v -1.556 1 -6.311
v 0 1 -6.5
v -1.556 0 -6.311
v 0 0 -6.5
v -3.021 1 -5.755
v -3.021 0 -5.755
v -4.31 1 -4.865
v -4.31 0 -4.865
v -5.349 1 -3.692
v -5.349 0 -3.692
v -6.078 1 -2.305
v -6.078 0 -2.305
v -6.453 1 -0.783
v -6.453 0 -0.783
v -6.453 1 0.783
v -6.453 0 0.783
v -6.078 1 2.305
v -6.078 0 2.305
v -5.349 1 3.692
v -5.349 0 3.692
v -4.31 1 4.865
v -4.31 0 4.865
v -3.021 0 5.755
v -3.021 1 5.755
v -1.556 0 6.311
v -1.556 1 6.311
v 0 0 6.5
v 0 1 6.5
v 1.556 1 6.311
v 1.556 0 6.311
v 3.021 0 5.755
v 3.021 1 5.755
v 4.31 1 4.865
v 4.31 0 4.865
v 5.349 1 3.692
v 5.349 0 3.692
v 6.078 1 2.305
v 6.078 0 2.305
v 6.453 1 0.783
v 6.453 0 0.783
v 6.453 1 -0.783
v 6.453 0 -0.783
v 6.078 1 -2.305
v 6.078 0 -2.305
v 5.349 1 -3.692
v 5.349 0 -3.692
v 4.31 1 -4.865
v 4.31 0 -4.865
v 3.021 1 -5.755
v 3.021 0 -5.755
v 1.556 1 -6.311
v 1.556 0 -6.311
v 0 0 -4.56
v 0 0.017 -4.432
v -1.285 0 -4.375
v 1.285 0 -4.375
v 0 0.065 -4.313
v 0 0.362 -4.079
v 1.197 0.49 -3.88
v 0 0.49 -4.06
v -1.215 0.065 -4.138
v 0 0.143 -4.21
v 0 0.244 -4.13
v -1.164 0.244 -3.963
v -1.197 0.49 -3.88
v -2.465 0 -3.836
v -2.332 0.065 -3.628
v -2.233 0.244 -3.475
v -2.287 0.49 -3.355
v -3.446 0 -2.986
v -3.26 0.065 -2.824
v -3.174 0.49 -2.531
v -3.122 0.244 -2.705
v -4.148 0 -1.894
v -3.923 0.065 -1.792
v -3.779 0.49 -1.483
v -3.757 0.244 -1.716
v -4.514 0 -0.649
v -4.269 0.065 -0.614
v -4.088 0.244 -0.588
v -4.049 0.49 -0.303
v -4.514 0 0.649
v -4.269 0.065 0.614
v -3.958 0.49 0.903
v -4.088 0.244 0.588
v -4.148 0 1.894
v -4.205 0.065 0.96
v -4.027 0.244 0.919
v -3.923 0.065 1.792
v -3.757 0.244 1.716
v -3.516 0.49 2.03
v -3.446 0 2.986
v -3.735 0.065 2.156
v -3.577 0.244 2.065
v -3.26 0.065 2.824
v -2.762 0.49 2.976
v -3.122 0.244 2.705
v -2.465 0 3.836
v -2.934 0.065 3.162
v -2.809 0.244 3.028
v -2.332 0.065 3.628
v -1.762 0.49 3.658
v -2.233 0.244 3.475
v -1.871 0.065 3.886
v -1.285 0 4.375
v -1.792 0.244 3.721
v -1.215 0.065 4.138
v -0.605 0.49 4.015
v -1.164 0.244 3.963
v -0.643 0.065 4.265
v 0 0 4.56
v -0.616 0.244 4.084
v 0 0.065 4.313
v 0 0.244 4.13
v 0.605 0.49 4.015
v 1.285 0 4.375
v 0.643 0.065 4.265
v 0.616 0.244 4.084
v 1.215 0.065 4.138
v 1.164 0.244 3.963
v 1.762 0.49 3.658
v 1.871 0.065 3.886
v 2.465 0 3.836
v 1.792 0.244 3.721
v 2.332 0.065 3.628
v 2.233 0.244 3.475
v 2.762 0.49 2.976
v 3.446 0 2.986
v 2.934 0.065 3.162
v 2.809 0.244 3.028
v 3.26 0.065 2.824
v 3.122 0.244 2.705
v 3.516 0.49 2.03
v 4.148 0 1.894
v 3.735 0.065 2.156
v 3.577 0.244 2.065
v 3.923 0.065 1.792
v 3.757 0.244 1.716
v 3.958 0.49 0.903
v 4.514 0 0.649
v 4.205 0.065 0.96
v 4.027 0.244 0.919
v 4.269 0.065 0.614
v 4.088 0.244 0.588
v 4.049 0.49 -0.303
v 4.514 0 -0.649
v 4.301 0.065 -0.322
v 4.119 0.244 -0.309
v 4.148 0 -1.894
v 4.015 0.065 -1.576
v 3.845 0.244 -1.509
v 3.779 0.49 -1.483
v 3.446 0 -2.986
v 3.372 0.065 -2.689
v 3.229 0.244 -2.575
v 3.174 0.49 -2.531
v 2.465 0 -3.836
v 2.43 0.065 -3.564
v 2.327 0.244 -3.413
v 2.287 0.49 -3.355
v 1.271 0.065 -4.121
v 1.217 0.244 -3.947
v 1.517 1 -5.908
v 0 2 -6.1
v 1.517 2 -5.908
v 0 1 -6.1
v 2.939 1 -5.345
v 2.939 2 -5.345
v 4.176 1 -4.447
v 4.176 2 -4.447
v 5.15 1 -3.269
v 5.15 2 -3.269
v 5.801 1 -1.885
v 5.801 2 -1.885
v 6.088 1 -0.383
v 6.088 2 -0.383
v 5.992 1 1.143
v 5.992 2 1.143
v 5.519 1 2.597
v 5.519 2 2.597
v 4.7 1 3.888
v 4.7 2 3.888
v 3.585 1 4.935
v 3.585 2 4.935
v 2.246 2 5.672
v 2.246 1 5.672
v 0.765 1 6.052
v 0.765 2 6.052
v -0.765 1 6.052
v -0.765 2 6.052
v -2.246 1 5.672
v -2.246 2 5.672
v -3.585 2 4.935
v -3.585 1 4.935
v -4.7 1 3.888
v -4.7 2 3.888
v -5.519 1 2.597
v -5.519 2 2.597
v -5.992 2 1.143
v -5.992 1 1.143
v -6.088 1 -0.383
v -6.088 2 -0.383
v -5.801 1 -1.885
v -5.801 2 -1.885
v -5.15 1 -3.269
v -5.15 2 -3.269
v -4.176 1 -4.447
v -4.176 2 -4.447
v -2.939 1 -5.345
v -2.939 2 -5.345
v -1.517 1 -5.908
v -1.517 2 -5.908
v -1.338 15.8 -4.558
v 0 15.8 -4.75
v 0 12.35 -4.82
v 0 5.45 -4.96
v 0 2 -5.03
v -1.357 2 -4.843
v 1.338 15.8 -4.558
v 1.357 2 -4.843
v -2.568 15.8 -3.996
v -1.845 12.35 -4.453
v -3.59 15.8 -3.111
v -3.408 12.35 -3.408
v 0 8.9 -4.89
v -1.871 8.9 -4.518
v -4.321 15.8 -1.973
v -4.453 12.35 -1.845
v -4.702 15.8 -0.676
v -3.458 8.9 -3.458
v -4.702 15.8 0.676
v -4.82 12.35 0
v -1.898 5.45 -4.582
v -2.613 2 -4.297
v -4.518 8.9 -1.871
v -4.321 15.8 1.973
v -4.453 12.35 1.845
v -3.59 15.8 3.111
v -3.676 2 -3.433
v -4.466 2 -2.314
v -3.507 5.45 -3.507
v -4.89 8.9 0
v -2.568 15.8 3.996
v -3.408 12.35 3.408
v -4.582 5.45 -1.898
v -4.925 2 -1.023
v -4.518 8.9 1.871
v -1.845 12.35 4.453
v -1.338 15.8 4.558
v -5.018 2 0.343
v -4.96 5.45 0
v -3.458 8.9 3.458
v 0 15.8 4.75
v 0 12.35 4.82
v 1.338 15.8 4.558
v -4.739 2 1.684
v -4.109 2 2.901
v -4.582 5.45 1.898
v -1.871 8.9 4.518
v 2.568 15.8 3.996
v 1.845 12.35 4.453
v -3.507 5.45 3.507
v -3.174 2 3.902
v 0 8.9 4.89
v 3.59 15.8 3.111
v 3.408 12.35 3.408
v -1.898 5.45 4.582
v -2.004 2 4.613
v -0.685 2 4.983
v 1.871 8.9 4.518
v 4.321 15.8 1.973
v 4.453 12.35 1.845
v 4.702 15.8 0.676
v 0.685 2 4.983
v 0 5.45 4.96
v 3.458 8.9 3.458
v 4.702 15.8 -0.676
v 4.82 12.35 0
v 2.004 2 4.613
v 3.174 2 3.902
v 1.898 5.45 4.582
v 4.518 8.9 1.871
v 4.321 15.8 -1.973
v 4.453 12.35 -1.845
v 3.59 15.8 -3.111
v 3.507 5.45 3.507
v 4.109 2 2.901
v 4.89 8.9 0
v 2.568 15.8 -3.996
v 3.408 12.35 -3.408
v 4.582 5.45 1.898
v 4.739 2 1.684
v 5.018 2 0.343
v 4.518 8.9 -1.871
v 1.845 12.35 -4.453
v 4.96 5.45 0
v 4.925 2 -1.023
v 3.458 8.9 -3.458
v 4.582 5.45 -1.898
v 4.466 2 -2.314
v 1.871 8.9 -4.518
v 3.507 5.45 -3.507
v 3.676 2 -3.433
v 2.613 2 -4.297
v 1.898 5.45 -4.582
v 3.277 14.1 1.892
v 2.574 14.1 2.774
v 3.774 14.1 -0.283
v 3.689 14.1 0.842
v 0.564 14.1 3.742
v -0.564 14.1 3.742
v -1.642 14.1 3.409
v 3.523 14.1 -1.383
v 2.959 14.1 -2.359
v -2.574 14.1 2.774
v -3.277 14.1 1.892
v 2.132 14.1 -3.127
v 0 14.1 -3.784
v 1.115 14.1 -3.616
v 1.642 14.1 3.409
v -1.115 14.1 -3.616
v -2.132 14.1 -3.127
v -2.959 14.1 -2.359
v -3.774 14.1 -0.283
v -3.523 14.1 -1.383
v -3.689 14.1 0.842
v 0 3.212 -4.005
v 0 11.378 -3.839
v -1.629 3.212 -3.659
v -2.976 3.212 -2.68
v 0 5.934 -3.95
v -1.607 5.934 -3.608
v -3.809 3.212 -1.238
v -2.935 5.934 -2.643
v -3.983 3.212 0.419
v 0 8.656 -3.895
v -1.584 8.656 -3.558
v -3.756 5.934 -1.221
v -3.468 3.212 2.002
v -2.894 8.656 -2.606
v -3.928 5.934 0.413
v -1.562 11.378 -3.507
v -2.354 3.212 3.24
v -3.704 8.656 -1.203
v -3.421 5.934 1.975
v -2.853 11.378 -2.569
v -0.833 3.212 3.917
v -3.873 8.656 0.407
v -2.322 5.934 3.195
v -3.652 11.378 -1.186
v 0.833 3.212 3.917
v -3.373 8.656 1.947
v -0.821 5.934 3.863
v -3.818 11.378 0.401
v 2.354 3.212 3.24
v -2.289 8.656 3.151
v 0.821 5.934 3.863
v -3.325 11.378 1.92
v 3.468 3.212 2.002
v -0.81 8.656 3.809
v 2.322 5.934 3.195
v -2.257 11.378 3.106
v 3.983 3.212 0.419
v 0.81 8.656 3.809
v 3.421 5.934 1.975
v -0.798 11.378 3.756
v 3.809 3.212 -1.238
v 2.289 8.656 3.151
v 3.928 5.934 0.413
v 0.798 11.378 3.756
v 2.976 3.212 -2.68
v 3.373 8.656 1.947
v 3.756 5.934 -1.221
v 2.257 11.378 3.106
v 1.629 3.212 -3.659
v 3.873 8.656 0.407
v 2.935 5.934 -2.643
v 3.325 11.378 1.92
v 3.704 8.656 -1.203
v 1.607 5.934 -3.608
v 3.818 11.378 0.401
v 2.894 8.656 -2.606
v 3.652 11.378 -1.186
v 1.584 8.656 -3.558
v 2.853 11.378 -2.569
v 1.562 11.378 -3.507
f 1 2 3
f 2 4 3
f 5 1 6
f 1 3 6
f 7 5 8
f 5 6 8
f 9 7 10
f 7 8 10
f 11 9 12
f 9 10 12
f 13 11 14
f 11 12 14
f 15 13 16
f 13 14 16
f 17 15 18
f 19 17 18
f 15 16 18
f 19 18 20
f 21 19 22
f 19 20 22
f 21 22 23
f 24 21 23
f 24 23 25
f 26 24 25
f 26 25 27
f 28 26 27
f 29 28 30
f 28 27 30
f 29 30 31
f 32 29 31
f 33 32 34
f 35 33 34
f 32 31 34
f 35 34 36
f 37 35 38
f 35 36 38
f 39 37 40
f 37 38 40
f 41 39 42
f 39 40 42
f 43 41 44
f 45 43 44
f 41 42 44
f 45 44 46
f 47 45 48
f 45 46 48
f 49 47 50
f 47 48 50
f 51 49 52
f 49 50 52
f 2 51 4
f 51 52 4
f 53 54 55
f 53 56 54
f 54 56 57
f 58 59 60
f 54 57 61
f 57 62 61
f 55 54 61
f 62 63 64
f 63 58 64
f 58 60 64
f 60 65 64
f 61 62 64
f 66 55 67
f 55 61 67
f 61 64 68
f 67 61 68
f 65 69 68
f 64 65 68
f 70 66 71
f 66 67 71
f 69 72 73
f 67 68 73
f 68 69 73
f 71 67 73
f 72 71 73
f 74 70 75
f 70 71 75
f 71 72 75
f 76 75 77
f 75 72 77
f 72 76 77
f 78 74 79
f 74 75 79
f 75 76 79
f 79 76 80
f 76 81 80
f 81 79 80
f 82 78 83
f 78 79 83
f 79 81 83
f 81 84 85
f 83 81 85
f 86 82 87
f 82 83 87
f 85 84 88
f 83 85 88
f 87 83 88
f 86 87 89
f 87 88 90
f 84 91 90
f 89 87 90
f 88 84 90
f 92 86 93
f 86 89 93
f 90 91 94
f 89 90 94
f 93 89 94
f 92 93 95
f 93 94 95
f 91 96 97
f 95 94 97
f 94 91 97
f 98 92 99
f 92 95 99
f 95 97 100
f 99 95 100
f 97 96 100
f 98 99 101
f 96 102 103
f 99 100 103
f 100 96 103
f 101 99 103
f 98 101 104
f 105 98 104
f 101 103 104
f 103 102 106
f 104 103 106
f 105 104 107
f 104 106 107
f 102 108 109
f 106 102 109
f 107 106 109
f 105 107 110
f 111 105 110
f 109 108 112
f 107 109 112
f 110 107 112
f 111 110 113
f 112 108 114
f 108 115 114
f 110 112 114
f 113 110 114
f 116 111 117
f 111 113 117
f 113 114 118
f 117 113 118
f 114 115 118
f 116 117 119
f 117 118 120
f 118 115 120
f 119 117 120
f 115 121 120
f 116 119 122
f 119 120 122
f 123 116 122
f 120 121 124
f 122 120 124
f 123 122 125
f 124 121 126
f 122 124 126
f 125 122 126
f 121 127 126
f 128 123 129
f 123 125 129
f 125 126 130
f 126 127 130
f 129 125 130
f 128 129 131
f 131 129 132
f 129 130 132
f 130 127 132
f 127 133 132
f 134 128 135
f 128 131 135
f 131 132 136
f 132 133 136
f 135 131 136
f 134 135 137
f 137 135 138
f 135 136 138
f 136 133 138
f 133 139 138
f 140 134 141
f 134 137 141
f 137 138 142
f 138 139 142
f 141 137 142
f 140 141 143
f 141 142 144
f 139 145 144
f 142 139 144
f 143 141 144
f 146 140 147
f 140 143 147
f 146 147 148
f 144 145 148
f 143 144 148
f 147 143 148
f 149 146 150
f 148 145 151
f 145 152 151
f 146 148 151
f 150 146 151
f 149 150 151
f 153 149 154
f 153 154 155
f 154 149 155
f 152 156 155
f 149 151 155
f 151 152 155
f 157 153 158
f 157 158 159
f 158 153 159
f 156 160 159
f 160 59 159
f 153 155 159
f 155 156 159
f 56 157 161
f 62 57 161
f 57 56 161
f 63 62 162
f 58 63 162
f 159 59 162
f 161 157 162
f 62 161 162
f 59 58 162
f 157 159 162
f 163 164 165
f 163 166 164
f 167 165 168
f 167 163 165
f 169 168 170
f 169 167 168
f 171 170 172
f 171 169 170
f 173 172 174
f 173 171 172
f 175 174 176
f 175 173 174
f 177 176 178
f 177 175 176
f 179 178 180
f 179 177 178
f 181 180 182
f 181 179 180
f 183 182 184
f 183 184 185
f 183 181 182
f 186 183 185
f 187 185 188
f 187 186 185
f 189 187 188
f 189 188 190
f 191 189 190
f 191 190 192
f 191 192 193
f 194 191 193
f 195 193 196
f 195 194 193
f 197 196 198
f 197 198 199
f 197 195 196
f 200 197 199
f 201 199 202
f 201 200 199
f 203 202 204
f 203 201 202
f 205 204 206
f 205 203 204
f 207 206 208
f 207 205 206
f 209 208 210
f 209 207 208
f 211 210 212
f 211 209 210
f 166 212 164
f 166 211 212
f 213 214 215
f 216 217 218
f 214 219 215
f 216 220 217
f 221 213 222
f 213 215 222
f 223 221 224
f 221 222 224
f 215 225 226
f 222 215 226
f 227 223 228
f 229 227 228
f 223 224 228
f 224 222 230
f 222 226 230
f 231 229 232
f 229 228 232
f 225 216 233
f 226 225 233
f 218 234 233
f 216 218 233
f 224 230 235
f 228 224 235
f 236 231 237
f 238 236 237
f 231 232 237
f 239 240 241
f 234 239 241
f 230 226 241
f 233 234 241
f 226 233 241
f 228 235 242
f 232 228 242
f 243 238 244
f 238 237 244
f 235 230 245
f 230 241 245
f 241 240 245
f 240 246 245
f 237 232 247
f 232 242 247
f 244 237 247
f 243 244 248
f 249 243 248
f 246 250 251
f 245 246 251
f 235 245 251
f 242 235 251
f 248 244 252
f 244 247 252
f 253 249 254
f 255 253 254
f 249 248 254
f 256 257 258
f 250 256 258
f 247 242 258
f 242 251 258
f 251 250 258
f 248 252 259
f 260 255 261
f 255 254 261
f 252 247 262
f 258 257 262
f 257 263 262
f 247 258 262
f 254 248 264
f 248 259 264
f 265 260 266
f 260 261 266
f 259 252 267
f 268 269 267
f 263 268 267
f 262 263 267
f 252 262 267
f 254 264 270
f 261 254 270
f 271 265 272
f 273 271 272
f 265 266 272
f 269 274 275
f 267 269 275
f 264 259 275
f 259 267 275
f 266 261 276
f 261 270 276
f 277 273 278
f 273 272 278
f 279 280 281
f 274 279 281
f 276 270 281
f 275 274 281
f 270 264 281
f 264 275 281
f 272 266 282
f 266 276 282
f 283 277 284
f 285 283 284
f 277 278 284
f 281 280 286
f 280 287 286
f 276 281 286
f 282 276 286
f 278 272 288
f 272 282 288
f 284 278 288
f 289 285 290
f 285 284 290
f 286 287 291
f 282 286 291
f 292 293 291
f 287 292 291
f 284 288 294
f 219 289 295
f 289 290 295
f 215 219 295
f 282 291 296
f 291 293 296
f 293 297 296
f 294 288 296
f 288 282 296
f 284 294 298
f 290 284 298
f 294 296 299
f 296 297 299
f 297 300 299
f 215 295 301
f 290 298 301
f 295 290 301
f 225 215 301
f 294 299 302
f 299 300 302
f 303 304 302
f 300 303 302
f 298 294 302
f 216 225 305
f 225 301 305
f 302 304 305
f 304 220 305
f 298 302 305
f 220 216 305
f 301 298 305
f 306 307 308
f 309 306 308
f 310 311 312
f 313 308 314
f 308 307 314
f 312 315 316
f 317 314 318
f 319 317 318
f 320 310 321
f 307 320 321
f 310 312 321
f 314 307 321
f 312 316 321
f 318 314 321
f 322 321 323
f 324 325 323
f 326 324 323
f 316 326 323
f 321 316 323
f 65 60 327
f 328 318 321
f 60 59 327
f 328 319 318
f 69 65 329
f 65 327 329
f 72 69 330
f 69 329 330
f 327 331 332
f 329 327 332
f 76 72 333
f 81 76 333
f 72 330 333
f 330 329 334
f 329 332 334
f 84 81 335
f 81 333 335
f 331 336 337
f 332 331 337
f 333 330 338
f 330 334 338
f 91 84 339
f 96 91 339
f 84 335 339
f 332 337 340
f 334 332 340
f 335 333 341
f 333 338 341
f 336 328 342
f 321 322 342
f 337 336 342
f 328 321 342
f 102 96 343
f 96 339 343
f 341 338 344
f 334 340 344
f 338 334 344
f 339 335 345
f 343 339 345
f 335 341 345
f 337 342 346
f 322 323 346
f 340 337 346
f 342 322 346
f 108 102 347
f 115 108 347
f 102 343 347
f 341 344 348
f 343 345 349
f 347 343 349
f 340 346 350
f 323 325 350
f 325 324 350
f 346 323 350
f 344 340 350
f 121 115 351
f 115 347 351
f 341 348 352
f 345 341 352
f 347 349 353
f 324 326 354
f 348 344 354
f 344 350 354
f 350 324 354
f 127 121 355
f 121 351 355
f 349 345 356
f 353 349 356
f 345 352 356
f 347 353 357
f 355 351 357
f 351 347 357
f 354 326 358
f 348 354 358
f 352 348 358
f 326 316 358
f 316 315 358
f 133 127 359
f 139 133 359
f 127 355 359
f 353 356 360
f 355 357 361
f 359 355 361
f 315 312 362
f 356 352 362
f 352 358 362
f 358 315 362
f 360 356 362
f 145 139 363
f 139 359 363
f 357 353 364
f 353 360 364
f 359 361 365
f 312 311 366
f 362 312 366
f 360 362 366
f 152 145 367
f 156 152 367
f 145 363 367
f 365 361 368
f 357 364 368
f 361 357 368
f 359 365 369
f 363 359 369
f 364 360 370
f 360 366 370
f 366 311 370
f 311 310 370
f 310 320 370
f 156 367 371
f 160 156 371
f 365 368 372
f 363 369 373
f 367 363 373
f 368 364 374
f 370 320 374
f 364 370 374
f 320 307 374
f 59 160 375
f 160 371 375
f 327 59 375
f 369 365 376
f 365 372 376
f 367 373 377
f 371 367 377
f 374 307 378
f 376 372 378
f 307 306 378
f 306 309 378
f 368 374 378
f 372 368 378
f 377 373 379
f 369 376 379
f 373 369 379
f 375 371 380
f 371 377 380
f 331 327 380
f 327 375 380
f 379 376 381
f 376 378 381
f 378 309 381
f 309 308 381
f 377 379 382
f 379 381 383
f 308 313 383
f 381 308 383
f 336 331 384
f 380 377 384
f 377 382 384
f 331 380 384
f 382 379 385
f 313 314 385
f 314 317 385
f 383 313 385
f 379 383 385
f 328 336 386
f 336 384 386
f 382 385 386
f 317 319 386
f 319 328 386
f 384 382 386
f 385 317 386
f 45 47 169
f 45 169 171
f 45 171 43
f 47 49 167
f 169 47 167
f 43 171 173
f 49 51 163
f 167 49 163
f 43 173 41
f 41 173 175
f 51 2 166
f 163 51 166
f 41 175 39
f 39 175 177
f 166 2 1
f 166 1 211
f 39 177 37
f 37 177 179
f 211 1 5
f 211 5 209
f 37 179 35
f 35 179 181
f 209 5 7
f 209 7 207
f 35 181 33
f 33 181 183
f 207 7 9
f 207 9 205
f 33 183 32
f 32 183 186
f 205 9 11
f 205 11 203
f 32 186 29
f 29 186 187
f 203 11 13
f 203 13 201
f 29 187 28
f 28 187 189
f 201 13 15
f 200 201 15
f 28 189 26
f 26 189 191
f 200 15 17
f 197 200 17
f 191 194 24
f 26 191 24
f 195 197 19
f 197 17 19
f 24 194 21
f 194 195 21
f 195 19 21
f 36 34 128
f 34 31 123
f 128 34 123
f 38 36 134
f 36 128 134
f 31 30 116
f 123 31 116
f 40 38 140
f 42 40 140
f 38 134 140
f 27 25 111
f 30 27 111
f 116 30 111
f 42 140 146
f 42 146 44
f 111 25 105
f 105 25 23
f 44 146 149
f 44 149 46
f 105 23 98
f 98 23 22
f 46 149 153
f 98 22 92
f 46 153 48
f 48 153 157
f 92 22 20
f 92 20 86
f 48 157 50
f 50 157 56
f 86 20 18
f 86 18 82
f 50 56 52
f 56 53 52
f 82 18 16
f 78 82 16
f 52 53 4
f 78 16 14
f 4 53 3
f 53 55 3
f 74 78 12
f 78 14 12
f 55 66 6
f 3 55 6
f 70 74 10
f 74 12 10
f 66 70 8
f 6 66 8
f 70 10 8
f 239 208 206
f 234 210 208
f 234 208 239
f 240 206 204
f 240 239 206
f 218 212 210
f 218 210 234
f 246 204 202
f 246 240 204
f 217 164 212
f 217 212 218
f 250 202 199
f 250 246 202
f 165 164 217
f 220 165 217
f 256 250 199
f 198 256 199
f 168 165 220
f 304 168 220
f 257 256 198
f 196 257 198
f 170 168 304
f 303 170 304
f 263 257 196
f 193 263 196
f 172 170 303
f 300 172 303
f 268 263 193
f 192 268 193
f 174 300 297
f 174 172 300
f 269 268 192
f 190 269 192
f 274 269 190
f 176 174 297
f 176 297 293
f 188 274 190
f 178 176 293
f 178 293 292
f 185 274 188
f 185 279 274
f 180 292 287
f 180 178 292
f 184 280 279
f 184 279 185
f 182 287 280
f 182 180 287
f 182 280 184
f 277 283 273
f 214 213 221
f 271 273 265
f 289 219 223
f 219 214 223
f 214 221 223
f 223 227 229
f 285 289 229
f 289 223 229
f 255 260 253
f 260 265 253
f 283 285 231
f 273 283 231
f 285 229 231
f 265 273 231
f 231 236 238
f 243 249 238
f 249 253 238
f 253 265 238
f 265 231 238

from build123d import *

# Parameters (mm, degrees)
INSIDEBOREF_R = 0.5


with BuildPart() as part:
    # MainBodyS → MainBody (revolve)
    with BuildSketch(Plane.XY, mode=Mode.PRIVATE) as mainbody_sk:
        Polygon((0, 15.8), (4.75, 15.8), (5.05, 1), (6.5, 1), (6.5, 0), (4.070064849, 0), (3.784254039, 14.1), (0, 14.1), align=None)
    revolve(mainbody_sk.sketch.rotate(Axis((0, 0, 0), (0, 1, 0)), 90), axis=Axis((0, 0, 0), (0, 1, 0)))

    # InsertBodyS → InsertBody (revolve)
    with BuildSketch(Plane.XY, mode=Mode.PRIVATE) as insertbody_sk:
        Polygon((5.02972973, 2), (6.1, 2), (6.1, 1), (5.05, 1), align=None)
    revolve(insertbody_sk.sketch.rotate(Axis((0, 1, 0), (0, -1, 0)), 270), axis=Axis((0, 1, 0), (0, -1, 0)))

    # InsideBoreF
    insideboref_edges = [part.edges().sort_by_distance(p)[0] for p in [
        (0, 0, 4.070064849),
    ]]
    fillet(insideboref_edges, radius=INSIDEBOREF_R)


solid = part.part
